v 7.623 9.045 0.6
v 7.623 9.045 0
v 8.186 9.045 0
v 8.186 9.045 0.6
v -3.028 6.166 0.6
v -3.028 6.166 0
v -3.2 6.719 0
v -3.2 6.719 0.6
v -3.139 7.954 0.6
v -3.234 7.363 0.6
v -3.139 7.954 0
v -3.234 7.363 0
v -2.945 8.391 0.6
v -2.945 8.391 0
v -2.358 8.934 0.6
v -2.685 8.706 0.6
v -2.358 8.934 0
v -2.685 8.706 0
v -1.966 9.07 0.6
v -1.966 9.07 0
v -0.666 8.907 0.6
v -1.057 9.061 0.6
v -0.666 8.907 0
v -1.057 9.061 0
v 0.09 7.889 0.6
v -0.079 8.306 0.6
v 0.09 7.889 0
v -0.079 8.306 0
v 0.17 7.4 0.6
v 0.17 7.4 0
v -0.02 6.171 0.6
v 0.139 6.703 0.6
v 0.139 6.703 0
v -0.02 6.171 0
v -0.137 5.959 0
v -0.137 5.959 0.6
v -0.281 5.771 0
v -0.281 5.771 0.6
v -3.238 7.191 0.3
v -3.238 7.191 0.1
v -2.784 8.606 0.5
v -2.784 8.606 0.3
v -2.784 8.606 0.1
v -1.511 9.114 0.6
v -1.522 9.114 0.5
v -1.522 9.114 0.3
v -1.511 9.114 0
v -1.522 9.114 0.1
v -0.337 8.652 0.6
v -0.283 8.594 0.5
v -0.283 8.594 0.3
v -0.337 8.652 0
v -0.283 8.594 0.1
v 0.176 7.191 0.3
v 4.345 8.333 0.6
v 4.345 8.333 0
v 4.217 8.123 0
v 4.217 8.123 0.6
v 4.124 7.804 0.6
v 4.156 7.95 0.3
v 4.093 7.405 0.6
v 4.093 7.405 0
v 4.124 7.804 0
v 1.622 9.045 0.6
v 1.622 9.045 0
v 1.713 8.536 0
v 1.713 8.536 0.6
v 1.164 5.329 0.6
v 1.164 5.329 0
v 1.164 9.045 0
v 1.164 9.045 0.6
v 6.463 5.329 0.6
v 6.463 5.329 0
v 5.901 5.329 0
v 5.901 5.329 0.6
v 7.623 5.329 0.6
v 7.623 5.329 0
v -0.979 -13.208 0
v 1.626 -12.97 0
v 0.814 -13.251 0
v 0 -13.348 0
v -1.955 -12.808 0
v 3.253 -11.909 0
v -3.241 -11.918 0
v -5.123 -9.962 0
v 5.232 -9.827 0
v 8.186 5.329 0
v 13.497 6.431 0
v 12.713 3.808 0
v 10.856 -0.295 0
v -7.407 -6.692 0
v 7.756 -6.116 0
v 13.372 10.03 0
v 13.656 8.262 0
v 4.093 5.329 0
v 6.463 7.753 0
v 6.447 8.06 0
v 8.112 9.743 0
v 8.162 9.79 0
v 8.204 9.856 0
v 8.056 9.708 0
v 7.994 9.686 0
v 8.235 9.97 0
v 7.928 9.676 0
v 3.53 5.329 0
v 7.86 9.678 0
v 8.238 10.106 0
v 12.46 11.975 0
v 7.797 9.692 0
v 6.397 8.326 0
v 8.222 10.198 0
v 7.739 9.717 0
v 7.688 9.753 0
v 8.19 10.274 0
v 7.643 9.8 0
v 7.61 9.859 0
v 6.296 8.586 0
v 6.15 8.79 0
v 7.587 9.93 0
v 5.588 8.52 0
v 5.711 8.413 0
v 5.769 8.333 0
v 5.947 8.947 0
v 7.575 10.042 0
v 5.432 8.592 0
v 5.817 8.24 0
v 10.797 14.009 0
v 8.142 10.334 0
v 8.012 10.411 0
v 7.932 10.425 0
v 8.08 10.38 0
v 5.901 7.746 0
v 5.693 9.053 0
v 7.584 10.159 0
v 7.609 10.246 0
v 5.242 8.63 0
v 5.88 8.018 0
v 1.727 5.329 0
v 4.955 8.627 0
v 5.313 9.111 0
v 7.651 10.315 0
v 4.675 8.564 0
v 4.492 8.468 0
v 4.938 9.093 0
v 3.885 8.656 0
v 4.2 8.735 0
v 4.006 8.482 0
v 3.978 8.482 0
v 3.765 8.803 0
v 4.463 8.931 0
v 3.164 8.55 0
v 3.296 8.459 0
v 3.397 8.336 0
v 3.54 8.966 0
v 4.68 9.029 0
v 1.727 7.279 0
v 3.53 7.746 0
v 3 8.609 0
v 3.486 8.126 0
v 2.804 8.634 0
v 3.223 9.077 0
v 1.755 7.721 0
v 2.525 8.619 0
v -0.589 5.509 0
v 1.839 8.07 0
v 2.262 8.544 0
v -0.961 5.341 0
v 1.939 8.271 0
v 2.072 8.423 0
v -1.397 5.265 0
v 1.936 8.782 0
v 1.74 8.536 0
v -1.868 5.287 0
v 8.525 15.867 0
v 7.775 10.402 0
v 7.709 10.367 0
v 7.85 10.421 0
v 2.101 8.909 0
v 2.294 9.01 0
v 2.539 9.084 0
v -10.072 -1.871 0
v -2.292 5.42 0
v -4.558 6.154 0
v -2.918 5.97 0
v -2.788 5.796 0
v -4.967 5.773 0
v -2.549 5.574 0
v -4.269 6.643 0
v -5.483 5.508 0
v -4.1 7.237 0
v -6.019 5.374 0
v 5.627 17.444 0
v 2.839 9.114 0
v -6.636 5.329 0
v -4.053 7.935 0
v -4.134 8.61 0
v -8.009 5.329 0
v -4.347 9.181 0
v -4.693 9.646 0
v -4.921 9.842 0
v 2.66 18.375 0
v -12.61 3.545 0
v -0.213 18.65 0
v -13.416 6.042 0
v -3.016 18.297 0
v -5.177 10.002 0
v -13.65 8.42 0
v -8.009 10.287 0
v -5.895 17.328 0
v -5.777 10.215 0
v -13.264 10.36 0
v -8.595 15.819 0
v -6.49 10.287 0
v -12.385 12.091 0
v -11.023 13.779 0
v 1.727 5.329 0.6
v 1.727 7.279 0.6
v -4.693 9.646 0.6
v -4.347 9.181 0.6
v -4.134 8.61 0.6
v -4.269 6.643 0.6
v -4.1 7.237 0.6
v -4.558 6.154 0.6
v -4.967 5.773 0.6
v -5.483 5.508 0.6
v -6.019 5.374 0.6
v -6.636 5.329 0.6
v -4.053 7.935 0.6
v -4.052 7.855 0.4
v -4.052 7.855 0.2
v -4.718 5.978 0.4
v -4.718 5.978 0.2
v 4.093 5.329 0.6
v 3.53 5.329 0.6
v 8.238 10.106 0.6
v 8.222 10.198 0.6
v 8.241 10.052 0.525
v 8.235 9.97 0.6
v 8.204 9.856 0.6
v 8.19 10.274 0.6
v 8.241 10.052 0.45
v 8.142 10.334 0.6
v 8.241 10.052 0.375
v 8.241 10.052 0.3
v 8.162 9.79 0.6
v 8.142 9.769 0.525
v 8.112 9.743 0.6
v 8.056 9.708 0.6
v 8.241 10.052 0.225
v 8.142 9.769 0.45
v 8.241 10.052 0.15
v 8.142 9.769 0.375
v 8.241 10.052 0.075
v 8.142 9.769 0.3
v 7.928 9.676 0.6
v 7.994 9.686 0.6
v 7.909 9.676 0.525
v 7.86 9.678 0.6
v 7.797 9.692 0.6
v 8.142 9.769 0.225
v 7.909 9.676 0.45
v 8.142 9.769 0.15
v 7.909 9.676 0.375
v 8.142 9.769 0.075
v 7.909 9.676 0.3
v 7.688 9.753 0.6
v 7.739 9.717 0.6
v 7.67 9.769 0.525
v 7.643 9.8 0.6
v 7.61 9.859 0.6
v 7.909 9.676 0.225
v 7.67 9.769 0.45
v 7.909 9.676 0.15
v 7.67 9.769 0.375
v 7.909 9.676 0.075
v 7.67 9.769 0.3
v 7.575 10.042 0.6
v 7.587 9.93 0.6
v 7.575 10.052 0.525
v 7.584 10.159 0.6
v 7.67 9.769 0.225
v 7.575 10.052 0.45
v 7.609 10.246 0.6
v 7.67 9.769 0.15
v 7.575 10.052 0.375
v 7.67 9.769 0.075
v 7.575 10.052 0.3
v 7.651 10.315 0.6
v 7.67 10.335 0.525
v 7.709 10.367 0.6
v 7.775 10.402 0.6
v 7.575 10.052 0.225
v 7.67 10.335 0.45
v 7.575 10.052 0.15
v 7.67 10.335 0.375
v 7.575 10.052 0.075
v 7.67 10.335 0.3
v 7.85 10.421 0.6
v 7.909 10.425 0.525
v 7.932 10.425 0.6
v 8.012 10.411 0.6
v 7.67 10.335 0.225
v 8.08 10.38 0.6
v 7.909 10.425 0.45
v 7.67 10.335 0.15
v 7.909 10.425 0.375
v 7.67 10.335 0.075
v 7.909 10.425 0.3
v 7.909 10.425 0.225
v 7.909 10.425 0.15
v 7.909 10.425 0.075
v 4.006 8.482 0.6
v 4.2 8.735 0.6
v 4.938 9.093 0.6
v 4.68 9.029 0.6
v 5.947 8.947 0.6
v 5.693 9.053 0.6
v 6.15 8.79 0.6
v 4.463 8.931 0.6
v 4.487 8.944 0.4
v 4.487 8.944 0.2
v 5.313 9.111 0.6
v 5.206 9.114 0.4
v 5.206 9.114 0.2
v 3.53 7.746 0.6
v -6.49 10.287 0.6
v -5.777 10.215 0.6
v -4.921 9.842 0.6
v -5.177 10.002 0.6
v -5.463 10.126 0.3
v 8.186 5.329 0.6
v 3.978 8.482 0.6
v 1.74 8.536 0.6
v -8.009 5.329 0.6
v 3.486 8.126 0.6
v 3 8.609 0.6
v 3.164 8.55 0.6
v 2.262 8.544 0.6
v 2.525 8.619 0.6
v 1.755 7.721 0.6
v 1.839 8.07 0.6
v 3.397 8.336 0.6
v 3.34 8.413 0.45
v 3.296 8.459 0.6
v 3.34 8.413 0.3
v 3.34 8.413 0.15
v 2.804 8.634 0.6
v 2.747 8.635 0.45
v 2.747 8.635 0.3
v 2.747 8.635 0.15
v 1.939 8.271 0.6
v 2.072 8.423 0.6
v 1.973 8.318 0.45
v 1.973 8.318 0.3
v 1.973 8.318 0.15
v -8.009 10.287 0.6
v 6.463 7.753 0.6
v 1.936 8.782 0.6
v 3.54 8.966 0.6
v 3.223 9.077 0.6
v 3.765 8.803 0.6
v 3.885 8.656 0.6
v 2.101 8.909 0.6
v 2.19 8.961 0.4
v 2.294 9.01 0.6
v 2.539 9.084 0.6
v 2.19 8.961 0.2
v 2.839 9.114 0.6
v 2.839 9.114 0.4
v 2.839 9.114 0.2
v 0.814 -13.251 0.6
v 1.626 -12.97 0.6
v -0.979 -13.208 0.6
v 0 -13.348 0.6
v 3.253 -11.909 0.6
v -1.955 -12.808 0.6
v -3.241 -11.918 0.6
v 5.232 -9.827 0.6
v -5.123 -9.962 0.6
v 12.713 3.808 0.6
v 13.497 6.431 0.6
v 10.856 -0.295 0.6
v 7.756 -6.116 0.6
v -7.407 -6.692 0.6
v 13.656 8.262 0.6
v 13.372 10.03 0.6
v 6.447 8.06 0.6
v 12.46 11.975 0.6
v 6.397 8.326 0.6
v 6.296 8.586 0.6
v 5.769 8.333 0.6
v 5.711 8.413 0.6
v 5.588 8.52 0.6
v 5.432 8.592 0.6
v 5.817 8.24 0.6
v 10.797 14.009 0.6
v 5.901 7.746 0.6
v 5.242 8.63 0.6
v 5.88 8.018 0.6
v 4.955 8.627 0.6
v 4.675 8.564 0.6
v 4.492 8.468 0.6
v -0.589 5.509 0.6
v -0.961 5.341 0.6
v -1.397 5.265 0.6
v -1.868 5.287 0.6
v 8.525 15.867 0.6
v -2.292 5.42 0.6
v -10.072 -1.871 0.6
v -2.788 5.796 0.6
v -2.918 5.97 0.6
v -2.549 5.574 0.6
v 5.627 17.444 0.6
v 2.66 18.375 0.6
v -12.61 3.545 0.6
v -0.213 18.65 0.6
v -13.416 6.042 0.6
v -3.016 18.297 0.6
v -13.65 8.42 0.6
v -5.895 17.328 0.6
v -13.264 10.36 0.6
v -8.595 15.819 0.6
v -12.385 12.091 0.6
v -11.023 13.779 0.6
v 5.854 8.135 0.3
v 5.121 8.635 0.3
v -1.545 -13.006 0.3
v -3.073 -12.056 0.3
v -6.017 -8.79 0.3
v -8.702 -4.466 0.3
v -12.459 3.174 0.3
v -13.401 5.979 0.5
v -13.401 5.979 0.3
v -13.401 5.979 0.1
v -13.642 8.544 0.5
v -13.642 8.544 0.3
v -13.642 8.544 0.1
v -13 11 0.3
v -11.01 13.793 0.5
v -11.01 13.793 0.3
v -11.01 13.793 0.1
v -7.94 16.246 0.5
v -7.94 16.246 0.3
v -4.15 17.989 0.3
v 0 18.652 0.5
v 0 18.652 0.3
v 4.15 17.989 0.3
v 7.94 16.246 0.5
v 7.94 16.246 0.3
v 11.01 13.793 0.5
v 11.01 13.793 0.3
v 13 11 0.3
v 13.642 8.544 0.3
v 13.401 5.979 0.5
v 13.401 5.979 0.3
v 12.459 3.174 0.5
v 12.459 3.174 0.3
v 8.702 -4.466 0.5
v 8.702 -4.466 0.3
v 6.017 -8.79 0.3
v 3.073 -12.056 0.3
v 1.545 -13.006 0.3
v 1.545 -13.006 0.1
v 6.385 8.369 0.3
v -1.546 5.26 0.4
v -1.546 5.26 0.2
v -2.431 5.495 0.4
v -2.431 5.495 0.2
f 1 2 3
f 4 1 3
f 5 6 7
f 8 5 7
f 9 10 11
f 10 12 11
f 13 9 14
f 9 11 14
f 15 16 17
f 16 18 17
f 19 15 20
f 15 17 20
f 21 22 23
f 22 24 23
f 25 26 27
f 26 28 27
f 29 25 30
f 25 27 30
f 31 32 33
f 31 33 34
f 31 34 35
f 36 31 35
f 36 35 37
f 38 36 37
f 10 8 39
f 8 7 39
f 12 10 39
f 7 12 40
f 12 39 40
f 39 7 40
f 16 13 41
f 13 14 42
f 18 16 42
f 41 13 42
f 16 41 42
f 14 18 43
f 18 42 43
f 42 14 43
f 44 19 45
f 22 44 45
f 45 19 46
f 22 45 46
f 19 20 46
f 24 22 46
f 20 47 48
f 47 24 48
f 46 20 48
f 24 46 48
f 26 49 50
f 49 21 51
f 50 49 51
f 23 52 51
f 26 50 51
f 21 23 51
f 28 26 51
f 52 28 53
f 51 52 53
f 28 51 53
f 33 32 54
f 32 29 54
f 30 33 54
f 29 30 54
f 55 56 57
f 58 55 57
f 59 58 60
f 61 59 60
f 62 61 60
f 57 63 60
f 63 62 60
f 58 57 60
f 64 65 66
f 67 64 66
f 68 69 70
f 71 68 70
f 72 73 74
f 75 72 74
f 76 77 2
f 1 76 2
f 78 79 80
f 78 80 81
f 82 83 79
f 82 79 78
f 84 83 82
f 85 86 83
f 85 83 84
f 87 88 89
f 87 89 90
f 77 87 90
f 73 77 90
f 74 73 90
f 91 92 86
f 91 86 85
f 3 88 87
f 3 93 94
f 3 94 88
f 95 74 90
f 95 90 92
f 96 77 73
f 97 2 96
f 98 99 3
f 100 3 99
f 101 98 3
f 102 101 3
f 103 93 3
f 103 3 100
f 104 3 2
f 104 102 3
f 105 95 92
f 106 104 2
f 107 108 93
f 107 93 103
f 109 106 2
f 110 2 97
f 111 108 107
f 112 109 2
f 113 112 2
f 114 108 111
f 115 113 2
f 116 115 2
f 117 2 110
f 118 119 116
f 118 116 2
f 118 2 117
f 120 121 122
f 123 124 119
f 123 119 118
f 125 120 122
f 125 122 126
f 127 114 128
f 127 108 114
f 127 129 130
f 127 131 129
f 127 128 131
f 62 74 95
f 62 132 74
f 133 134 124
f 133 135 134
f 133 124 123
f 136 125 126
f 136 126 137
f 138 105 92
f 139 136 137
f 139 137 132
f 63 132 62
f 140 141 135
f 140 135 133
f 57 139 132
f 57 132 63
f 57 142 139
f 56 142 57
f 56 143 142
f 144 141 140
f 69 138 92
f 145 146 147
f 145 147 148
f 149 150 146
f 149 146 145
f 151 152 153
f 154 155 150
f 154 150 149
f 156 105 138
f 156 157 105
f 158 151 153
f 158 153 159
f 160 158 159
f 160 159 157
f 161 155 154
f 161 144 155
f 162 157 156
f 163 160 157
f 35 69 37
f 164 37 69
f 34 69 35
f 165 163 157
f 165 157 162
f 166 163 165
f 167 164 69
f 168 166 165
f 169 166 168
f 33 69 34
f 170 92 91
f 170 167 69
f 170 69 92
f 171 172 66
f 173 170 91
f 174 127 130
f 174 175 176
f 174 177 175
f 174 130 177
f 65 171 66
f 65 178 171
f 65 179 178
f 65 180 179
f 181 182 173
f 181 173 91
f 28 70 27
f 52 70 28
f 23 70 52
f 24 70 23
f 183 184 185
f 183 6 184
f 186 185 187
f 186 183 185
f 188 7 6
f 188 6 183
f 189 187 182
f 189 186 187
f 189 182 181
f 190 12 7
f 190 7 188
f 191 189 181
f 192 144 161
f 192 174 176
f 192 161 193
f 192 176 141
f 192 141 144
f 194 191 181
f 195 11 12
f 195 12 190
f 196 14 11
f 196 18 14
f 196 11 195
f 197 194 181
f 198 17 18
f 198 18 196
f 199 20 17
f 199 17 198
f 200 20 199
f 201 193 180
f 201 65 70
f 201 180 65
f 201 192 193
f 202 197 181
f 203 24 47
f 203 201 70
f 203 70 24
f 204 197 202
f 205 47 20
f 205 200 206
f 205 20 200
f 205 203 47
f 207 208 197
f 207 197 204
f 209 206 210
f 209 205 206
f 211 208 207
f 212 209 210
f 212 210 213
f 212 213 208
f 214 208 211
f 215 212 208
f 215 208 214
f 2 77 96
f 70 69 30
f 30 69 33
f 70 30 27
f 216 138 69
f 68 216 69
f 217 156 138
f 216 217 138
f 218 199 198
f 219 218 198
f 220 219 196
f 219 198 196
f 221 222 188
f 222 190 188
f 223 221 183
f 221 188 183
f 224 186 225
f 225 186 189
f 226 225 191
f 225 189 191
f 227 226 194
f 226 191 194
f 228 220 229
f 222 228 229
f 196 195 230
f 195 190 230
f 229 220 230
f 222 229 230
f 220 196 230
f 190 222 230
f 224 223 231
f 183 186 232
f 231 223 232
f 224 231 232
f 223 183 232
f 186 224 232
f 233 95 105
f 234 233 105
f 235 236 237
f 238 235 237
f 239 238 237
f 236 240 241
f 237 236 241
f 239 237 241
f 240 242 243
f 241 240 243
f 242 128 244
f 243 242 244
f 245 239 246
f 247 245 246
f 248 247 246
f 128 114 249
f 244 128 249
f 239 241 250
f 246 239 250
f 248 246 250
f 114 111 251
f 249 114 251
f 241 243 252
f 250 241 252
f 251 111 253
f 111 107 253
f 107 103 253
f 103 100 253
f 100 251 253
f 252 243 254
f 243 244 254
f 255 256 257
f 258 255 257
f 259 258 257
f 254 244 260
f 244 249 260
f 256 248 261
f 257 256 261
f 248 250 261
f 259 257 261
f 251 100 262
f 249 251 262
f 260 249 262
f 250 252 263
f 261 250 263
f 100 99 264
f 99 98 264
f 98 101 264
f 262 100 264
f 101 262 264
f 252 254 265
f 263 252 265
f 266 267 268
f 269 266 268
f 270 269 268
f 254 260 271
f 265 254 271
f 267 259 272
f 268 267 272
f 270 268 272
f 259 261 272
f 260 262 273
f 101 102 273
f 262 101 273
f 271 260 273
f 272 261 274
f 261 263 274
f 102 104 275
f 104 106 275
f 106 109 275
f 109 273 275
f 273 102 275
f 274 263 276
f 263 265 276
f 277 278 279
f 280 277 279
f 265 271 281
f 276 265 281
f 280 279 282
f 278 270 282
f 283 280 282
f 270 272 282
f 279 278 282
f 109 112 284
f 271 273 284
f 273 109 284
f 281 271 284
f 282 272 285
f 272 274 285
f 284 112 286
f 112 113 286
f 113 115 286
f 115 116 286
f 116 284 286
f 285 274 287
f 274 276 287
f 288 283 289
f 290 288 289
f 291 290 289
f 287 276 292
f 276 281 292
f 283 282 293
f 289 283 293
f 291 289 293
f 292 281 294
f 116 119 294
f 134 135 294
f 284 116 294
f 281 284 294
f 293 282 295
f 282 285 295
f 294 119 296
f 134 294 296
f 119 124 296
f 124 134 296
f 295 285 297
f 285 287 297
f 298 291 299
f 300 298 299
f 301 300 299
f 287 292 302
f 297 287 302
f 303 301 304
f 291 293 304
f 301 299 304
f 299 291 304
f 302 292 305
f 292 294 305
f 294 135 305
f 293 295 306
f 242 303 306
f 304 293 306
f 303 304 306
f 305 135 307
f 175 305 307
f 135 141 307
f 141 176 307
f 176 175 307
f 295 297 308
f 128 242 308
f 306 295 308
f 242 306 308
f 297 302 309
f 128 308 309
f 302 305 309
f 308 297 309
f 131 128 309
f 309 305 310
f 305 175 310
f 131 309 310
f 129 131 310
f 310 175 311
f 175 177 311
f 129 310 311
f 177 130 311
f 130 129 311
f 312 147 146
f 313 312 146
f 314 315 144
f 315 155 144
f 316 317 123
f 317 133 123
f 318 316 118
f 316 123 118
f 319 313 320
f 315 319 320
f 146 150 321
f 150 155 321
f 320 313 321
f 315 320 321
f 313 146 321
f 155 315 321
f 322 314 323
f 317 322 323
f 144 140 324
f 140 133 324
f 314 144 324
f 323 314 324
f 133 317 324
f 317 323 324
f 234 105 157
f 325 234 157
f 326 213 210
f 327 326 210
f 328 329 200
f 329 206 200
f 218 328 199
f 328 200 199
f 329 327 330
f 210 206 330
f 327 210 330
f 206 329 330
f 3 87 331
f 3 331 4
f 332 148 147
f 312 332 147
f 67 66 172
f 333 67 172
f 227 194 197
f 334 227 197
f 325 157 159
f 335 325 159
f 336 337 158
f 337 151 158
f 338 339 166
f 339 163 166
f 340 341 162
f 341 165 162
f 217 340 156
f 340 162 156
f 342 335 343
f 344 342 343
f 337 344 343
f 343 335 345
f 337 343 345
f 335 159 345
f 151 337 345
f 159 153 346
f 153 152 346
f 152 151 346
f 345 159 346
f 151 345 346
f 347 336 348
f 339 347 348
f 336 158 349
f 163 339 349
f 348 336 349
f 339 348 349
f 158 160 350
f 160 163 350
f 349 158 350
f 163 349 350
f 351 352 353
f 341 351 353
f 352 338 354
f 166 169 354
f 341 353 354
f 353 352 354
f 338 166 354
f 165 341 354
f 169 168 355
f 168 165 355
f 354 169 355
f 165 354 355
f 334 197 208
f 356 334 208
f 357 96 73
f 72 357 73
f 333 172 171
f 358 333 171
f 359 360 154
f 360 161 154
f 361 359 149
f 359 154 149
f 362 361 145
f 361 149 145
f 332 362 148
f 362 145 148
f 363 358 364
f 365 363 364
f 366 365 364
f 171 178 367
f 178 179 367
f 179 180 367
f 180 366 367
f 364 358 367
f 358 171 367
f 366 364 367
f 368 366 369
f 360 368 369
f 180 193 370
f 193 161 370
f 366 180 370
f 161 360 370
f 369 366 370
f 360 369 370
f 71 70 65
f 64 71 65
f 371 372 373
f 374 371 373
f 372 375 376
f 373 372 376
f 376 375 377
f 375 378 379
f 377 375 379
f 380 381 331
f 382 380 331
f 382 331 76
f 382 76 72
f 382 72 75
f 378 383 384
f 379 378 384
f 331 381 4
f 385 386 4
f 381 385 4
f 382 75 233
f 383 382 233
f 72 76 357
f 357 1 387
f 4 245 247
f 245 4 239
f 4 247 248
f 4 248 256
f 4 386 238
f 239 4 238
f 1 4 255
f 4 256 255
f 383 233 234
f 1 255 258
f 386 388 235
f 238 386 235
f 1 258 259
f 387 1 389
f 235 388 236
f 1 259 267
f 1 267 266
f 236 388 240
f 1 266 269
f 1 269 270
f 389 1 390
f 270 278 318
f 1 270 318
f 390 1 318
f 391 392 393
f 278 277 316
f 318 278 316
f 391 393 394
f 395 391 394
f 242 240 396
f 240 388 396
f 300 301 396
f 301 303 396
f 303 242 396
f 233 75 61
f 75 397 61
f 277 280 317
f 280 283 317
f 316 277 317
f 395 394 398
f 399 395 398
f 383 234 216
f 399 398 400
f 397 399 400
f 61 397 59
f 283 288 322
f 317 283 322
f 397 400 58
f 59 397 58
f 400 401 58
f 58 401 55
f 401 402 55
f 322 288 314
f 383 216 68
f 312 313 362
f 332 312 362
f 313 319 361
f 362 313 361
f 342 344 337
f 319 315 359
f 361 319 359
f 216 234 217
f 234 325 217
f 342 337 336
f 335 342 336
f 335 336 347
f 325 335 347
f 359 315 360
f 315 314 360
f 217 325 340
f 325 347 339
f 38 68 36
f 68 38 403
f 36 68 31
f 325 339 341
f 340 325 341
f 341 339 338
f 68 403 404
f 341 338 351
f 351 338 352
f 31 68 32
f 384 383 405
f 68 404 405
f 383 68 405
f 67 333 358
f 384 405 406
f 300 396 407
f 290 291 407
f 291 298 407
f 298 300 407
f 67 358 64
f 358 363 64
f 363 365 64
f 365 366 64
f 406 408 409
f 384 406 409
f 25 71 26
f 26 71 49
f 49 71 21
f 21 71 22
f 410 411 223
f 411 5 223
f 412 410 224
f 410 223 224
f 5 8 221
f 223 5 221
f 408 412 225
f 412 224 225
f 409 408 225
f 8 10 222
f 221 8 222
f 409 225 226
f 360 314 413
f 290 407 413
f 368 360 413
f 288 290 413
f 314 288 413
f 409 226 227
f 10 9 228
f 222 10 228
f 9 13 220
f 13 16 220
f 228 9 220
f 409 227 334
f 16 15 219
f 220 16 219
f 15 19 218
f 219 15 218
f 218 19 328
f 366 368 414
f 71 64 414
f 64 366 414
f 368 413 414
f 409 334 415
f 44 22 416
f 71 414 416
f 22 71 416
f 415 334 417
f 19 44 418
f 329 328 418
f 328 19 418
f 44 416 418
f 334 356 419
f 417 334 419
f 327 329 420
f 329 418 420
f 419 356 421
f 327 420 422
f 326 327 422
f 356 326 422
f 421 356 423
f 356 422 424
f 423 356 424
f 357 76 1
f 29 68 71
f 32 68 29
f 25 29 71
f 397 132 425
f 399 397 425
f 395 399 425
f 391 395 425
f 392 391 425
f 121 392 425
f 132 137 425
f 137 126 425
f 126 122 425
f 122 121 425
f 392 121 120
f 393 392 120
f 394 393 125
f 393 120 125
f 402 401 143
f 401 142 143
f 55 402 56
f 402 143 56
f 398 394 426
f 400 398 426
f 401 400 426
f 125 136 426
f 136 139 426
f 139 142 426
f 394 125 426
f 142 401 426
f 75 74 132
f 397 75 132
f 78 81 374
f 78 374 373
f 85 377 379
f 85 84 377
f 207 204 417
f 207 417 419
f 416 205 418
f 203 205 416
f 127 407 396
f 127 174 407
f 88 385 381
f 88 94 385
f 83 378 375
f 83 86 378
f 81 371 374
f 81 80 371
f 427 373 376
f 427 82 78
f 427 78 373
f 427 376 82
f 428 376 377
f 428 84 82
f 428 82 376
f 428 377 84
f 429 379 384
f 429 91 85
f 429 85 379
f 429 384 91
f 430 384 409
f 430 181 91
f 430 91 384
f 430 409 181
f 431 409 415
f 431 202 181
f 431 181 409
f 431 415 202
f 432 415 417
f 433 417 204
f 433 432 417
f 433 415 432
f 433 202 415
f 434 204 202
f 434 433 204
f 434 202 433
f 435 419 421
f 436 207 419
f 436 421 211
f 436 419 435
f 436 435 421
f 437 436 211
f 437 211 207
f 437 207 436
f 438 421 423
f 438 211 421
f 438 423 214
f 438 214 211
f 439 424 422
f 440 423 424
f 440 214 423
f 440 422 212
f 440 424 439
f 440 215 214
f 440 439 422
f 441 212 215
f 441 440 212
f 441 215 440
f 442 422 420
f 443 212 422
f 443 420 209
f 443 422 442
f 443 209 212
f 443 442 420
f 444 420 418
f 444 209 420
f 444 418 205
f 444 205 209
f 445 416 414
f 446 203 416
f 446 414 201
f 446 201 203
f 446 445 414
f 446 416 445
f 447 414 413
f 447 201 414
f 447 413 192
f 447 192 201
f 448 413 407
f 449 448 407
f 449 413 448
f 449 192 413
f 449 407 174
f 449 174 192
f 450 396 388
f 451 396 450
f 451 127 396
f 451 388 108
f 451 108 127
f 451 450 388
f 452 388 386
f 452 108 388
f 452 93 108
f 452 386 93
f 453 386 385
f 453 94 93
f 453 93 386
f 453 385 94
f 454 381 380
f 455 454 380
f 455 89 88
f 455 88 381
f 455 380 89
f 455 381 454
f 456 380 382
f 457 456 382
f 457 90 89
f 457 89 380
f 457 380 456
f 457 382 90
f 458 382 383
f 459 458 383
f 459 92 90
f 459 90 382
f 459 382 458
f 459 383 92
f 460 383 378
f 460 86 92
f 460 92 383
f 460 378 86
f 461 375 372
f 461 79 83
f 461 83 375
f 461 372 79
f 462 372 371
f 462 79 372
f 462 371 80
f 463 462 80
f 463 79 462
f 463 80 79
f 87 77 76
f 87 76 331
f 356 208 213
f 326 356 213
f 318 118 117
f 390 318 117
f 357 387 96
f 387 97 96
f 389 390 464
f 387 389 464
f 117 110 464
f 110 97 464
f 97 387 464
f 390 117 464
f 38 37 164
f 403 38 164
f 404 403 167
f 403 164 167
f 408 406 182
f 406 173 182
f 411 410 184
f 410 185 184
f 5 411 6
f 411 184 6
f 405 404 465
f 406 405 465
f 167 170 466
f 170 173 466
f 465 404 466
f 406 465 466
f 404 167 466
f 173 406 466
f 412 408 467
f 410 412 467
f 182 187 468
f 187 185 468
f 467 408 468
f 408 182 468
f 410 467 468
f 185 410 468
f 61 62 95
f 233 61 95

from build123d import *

# Parameters (mm, degrees)
F0_W     = 0.5631510417
F0_H     = 3.7163628472
F1_DEPTH = 0.6


with BuildPart() as f1:
    # F0 (on Top) → F1 (new body)
    with BuildSketch(Plane.XY):
        with BuildLine():
            add(Edge.make_bspline(
                [(0, -13.3484860004), (-4.1261352973, -13.3484860004), (-11.5695883563, 0.5525926673), (-16.058339722, 11.46014805), (0, 22.5159383761), (16.058339722, 11.46014805), (11.5695883563, 0.5525926673), (4.1261352973, -13.3484860004), (0, -13.3484860004)],
                knots=[0, 0, 0, 0, 0.18262571, 0.3294525753, 0.5, 0.6705474247, 0.81737429, 1, 1, 1, 1], degree=3))
        make_face()
        with BuildLine():
            add(Edge.make_bspline(
                [(-4.6929253472, 9.6457678287), (-4.0521918403, 9.0050343217), (-4.0521918403, 7.8548607106)],
                knots=[0, 0, 0, 1, 1, 1], degree=2))
            add(Edge.make_bspline(
                [(-4.0521918403, 7.8548607106), (-4.0521918403, 6.6276471689), (-4.7184244792, 5.9782331064)],
                knots=[0, 0, 0, 1, 1, 1], degree=2))
            add(Edge.make_bspline(
                [(-4.7184244792, 5.9782331064), (-5.3846571181, 5.3288190439), (-6.6357421875, 5.3288190439)],
                knots=[0, 0, 0, 1, 1, 1], degree=2))
            Line((-6.6357421875, 5.3288190439), (-8.0094401042, 5.3288190439))
            Line((-8.0094401042, 5.3288190439), (-8.0094401042, 10.2865013356))
            Line((-8.0094401042, 10.2865013356), (-6.4903428819, 10.2865013356))
            add(Edge.make_bspline(
                [(-6.4903428819, 10.2865013356), (-5.3336588542, 10.2865013356), (-4.6929253472, 9.6457678287)],
                knots=[0, 0, 0, 1, 1, 1], degree=2))
        make_face(mode=Mode.SUBTRACT)
        with BuildLine():
            add(Edge.make_bspline(
                [(-0.283203125, 8.594335537), (0.1763237847, 8.0751298078), (0.1763237847, 7.1907982106)],
                knots=[0, 0, 0, 1, 1, 1], degree=2))
            add(Edge.make_bspline(
                [(0.1763237847, 7.1907982106), (0.1763237847, 6.2815100162), (-0.2810329861, 5.7709848425)],
                knots=[0, 0, 0, 1, 1, 1], degree=2))
            add(Edge.make_bspline(
                [(-0.2810329861, 5.7709848425), (-0.7383897569, 5.2604596689), (-1.5456814236, 5.2604596689)],
                knots=[0, 0, 0, 1, 1, 1], degree=2))
            add(Edge.make_bspline(
                [(-1.5456814236, 5.2604596689), (-2.0448133681, 5.2604596689), (-2.4310980903, 5.4948346689)],
                knots=[0, 0, 0, 1, 1, 1], degree=2))
            add(Edge.make_bspline(
                [(-2.4310980903, 5.4948346689), (-2.8173828125, 5.7292096689), (-3.0278862847, 6.166492655)],
                knots=[0, 0, 0, 1, 1, 1], degree=2))
            add(Edge.make_bspline(
                [(-3.0278862847, 6.166492655), (-3.2383897569, 6.6037756412), (-3.2383897569, 7.1907982106)],
                knots=[0, 0, 0, 1, 1, 1], degree=2))
            add(Edge.make_bspline(
                [(-3.2383897569, 7.1907982106), (-3.2383897569, 8.0990013356), (-2.7837456597, 8.6062713009)],
                knots=[0, 0, 0, 1, 1, 1], degree=2))
            add(Edge.make_bspline(
                [(-2.7837456597, 8.6062713009), (-2.3291015625, 9.1135412662), (-1.5218098958, 9.1135412662)],
                knots=[0, 0, 0, 1, 1, 1], degree=2))
            add(Edge.make_bspline(
                [(-1.5218098958, 9.1135412662), (-0.7427300347, 9.1135412662), (-0.283203125, 8.594335537)],
                knots=[0, 0, 0, 1, 1, 1], degree=2))
        make_face(mode=Mode.SUBTRACT)
        with BuildLine():
            Line((6.4632161458, 5.3288190439), (5.9011501736, 5.3288190439))
            Line((5.9011501736, 5.3288190439), (5.9011501736, 7.7463537662))
            add(Edge.make_bspline(
                [(5.9011501736, 7.7463537662), (5.9011501736, 8.1912322384), (5.7112630208, 8.4131289398)],
                knots=[0, 0, 0, 1, 1, 1], degree=2))
            add(Edge.make_bspline(
                [(5.7112630208, 8.4131289398), (5.5213758681, 8.6350256412), (5.1209852431, 8.6350256412)],
                knots=[0, 0, 0, 1, 1, 1], degree=2))
            add(Edge.make_bspline(
                [(5.1209852431, 8.6350256412), (4.5958116319, 8.6350256412), (4.3446180556, 8.3333763356)],
                knots=[0, 0, 0, 1, 1, 1], degree=2))
            add(Edge.make_bspline(
                [(4.3446180556, 8.3333763356), (4.0934244792, 8.03172703), (4.0934244792, 7.4045568912)],
                knots=[0, 0, 0, 1, 1, 1], degree=2))
            Line((4.0934244792, 7.4045568912), (4.0934244792, 5.3288190439))
            Line((4.0934244792, 5.3288190439), (3.5302734375, 5.3288190439))
            Line((3.5302734375, 5.3288190439), (3.5302734375, 7.7463537662))
            add(Edge.make_bspline(
                [(3.5302734375, 7.7463537662), (3.5302734375, 8.1912322384), (3.3403862847, 8.4131289398)],
                knots=[0, 0, 0, 1, 1, 1], degree=2))
            add(Edge.make_bspline(
                [(3.3403862847, 8.4131289398), (3.1504991319, 8.6350256412), (2.7468532986, 8.6350256412)],
                knots=[0, 0, 0, 1, 1, 1], degree=2))
            add(Edge.make_bspline(
                [(2.7468532986, 8.6350256412), (2.2184244792, 8.6350256412), (1.97265625, 8.3181853634)],
                knots=[0, 0, 0, 1, 1, 1], degree=2))
            add(Edge.make_bspline(
                [(1.97265625, 8.3181853634), (1.7268880208, 8.0013450856), (1.7268880208, 7.2786888356)],
                knots=[0, 0, 0, 1, 1, 1], degree=2))
            Line((1.7268880208, 7.2786888356), (1.7268880208, 5.3288190439))
            Line((1.7268880208, 5.3288190439), (1.1637369792, 5.3288190439))
            Line((1.1637369792, 5.3288190439), (1.1637369792, 9.0451818912))
            Line((1.1637369792, 9.0451818912), (1.6216362847, 9.0451818912))
            Line((1.6216362847, 9.0451818912), (1.7127821181, 8.5362843217))
            Line((1.7127821181, 8.5362843217), (1.7399088542, 8.5362843217))
            add(Edge.make_bspline(
                [(1.7399088542, 8.5362843217), (1.8994140625, 8.8075516828), (2.1896701389, 8.9605464745)],
                knots=[0, 0, 0, 1, 1, 1], degree=2))
            add(Edge.make_bspline(
                [(2.1896701389, 8.9605464745), (2.4799262153, 9.1135412662), (2.8390842014, 9.1135412662)],
                knots=[0, 0, 0, 1, 1, 1], degree=2))
            add(Edge.make_bspline(
                [(2.8390842014, 9.1135412662), (3.7103949653, 9.1135412662), (3.9784071181, 8.4820308495)],
                knots=[0, 0, 0, 1, 1, 1], degree=2))
            Line((3.9784071181, 8.4820308495), (4.0055338542, 8.4820308495))
            add(Edge.make_bspline(
                [(4.0055338542, 8.4820308495), (4.1715494792, 8.77391453), (4.4867621528, 8.9437278981)],
                knots=[0, 0, 0, 1, 1, 1], degree=2))
            add(Edge.make_bspline(
                [(4.4867621528, 8.9437278981), (4.8019748264, 9.1135412662), (5.2056206597, 9.1135412662)],
                knots=[0, 0, 0, 1, 1, 1], degree=2))
            add(Edge.make_bspline(
                [(5.2056206597, 9.1135412662), (5.8360460069, 9.1135412662), (6.1496310764, 8.789648037)],
                knots=[0, 0, 0, 1, 1, 1], degree=2))
            add(Edge.make_bspline(
                [(6.1496310764, 8.789648037), (6.4632161458, 8.4657548078), (6.4632161458, 7.7528641828)],
                knots=[0, 0, 0, 1, 1, 1], degree=2))
            Line((6.4632161458, 7.7528641828), (6.4632161458, 5.3288190439))
        make_face(mode=Mode.SUBTRACT)
        with Locations((7.9047309028, 7.1870004675)):
            Rectangle(F0_W, F0_H, mode=Mode.SUBTRACT)
        with BuildLine():
            add(Edge.make_bspline(
                [(7.6703559028, 9.7689232106), (7.5754123264, 9.8622391828), (7.5754123264, 10.0521263356)],
                knots=[0, 0, 0, 1, 1, 1], degree=2))
            add(Edge.make_bspline(
                [(7.5754123264, 10.0521263356), (7.5754123264, 10.2452686967), (7.6703559028, 10.3353294606)],
                knots=[0, 0, 0, 1, 1, 1], degree=2))
            add(Edge.make_bspline(
                [(7.6703559028, 10.3353294606), (7.7652994792, 10.4253902245), (7.9085286458, 10.4253902245)],
                knots=[0, 0, 0, 1, 1, 1], degree=2))
            add(Edge.make_bspline(
                [(7.9085286458, 10.4253902245), (8.0441623264, 10.4253902245), (8.1423611111, 10.3337018564)],
                knots=[0, 0, 0, 1, 1, 1], degree=2))
            add(Edge.make_bspline(
                [(8.1423611111, 10.3337018564), (8.2405598958, 10.2420134884), (8.2405598958, 10.0521263356)],
                knots=[0, 0, 0, 1, 1, 1], degree=2))
            add(Edge.make_bspline(
                [(8.2405598958, 10.0521263356), (8.2405598958, 9.8622391828), (8.1423611111, 9.7689232106)],
                knots=[0, 0, 0, 1, 1, 1], degree=2))
            add(Edge.make_bspline(
                [(8.1423611111, 9.7689232106), (8.0441623264, 9.6756072384), (7.9085286458, 9.6756072384)],
                knots=[0, 0, 0, 1, 1, 1], degree=2))
            add(Edge.make_bspline(
                [(7.9085286458, 9.6756072384), (7.7652994792, 9.6756072384), (7.6703559028, 9.7689232106)],
                knots=[0, 0, 0, 1, 1, 1], degree=2))
        make_face(mode=Mode.SUBTRACT)
    extrude(amount=F1_DEPTH)


solid = f1.part
